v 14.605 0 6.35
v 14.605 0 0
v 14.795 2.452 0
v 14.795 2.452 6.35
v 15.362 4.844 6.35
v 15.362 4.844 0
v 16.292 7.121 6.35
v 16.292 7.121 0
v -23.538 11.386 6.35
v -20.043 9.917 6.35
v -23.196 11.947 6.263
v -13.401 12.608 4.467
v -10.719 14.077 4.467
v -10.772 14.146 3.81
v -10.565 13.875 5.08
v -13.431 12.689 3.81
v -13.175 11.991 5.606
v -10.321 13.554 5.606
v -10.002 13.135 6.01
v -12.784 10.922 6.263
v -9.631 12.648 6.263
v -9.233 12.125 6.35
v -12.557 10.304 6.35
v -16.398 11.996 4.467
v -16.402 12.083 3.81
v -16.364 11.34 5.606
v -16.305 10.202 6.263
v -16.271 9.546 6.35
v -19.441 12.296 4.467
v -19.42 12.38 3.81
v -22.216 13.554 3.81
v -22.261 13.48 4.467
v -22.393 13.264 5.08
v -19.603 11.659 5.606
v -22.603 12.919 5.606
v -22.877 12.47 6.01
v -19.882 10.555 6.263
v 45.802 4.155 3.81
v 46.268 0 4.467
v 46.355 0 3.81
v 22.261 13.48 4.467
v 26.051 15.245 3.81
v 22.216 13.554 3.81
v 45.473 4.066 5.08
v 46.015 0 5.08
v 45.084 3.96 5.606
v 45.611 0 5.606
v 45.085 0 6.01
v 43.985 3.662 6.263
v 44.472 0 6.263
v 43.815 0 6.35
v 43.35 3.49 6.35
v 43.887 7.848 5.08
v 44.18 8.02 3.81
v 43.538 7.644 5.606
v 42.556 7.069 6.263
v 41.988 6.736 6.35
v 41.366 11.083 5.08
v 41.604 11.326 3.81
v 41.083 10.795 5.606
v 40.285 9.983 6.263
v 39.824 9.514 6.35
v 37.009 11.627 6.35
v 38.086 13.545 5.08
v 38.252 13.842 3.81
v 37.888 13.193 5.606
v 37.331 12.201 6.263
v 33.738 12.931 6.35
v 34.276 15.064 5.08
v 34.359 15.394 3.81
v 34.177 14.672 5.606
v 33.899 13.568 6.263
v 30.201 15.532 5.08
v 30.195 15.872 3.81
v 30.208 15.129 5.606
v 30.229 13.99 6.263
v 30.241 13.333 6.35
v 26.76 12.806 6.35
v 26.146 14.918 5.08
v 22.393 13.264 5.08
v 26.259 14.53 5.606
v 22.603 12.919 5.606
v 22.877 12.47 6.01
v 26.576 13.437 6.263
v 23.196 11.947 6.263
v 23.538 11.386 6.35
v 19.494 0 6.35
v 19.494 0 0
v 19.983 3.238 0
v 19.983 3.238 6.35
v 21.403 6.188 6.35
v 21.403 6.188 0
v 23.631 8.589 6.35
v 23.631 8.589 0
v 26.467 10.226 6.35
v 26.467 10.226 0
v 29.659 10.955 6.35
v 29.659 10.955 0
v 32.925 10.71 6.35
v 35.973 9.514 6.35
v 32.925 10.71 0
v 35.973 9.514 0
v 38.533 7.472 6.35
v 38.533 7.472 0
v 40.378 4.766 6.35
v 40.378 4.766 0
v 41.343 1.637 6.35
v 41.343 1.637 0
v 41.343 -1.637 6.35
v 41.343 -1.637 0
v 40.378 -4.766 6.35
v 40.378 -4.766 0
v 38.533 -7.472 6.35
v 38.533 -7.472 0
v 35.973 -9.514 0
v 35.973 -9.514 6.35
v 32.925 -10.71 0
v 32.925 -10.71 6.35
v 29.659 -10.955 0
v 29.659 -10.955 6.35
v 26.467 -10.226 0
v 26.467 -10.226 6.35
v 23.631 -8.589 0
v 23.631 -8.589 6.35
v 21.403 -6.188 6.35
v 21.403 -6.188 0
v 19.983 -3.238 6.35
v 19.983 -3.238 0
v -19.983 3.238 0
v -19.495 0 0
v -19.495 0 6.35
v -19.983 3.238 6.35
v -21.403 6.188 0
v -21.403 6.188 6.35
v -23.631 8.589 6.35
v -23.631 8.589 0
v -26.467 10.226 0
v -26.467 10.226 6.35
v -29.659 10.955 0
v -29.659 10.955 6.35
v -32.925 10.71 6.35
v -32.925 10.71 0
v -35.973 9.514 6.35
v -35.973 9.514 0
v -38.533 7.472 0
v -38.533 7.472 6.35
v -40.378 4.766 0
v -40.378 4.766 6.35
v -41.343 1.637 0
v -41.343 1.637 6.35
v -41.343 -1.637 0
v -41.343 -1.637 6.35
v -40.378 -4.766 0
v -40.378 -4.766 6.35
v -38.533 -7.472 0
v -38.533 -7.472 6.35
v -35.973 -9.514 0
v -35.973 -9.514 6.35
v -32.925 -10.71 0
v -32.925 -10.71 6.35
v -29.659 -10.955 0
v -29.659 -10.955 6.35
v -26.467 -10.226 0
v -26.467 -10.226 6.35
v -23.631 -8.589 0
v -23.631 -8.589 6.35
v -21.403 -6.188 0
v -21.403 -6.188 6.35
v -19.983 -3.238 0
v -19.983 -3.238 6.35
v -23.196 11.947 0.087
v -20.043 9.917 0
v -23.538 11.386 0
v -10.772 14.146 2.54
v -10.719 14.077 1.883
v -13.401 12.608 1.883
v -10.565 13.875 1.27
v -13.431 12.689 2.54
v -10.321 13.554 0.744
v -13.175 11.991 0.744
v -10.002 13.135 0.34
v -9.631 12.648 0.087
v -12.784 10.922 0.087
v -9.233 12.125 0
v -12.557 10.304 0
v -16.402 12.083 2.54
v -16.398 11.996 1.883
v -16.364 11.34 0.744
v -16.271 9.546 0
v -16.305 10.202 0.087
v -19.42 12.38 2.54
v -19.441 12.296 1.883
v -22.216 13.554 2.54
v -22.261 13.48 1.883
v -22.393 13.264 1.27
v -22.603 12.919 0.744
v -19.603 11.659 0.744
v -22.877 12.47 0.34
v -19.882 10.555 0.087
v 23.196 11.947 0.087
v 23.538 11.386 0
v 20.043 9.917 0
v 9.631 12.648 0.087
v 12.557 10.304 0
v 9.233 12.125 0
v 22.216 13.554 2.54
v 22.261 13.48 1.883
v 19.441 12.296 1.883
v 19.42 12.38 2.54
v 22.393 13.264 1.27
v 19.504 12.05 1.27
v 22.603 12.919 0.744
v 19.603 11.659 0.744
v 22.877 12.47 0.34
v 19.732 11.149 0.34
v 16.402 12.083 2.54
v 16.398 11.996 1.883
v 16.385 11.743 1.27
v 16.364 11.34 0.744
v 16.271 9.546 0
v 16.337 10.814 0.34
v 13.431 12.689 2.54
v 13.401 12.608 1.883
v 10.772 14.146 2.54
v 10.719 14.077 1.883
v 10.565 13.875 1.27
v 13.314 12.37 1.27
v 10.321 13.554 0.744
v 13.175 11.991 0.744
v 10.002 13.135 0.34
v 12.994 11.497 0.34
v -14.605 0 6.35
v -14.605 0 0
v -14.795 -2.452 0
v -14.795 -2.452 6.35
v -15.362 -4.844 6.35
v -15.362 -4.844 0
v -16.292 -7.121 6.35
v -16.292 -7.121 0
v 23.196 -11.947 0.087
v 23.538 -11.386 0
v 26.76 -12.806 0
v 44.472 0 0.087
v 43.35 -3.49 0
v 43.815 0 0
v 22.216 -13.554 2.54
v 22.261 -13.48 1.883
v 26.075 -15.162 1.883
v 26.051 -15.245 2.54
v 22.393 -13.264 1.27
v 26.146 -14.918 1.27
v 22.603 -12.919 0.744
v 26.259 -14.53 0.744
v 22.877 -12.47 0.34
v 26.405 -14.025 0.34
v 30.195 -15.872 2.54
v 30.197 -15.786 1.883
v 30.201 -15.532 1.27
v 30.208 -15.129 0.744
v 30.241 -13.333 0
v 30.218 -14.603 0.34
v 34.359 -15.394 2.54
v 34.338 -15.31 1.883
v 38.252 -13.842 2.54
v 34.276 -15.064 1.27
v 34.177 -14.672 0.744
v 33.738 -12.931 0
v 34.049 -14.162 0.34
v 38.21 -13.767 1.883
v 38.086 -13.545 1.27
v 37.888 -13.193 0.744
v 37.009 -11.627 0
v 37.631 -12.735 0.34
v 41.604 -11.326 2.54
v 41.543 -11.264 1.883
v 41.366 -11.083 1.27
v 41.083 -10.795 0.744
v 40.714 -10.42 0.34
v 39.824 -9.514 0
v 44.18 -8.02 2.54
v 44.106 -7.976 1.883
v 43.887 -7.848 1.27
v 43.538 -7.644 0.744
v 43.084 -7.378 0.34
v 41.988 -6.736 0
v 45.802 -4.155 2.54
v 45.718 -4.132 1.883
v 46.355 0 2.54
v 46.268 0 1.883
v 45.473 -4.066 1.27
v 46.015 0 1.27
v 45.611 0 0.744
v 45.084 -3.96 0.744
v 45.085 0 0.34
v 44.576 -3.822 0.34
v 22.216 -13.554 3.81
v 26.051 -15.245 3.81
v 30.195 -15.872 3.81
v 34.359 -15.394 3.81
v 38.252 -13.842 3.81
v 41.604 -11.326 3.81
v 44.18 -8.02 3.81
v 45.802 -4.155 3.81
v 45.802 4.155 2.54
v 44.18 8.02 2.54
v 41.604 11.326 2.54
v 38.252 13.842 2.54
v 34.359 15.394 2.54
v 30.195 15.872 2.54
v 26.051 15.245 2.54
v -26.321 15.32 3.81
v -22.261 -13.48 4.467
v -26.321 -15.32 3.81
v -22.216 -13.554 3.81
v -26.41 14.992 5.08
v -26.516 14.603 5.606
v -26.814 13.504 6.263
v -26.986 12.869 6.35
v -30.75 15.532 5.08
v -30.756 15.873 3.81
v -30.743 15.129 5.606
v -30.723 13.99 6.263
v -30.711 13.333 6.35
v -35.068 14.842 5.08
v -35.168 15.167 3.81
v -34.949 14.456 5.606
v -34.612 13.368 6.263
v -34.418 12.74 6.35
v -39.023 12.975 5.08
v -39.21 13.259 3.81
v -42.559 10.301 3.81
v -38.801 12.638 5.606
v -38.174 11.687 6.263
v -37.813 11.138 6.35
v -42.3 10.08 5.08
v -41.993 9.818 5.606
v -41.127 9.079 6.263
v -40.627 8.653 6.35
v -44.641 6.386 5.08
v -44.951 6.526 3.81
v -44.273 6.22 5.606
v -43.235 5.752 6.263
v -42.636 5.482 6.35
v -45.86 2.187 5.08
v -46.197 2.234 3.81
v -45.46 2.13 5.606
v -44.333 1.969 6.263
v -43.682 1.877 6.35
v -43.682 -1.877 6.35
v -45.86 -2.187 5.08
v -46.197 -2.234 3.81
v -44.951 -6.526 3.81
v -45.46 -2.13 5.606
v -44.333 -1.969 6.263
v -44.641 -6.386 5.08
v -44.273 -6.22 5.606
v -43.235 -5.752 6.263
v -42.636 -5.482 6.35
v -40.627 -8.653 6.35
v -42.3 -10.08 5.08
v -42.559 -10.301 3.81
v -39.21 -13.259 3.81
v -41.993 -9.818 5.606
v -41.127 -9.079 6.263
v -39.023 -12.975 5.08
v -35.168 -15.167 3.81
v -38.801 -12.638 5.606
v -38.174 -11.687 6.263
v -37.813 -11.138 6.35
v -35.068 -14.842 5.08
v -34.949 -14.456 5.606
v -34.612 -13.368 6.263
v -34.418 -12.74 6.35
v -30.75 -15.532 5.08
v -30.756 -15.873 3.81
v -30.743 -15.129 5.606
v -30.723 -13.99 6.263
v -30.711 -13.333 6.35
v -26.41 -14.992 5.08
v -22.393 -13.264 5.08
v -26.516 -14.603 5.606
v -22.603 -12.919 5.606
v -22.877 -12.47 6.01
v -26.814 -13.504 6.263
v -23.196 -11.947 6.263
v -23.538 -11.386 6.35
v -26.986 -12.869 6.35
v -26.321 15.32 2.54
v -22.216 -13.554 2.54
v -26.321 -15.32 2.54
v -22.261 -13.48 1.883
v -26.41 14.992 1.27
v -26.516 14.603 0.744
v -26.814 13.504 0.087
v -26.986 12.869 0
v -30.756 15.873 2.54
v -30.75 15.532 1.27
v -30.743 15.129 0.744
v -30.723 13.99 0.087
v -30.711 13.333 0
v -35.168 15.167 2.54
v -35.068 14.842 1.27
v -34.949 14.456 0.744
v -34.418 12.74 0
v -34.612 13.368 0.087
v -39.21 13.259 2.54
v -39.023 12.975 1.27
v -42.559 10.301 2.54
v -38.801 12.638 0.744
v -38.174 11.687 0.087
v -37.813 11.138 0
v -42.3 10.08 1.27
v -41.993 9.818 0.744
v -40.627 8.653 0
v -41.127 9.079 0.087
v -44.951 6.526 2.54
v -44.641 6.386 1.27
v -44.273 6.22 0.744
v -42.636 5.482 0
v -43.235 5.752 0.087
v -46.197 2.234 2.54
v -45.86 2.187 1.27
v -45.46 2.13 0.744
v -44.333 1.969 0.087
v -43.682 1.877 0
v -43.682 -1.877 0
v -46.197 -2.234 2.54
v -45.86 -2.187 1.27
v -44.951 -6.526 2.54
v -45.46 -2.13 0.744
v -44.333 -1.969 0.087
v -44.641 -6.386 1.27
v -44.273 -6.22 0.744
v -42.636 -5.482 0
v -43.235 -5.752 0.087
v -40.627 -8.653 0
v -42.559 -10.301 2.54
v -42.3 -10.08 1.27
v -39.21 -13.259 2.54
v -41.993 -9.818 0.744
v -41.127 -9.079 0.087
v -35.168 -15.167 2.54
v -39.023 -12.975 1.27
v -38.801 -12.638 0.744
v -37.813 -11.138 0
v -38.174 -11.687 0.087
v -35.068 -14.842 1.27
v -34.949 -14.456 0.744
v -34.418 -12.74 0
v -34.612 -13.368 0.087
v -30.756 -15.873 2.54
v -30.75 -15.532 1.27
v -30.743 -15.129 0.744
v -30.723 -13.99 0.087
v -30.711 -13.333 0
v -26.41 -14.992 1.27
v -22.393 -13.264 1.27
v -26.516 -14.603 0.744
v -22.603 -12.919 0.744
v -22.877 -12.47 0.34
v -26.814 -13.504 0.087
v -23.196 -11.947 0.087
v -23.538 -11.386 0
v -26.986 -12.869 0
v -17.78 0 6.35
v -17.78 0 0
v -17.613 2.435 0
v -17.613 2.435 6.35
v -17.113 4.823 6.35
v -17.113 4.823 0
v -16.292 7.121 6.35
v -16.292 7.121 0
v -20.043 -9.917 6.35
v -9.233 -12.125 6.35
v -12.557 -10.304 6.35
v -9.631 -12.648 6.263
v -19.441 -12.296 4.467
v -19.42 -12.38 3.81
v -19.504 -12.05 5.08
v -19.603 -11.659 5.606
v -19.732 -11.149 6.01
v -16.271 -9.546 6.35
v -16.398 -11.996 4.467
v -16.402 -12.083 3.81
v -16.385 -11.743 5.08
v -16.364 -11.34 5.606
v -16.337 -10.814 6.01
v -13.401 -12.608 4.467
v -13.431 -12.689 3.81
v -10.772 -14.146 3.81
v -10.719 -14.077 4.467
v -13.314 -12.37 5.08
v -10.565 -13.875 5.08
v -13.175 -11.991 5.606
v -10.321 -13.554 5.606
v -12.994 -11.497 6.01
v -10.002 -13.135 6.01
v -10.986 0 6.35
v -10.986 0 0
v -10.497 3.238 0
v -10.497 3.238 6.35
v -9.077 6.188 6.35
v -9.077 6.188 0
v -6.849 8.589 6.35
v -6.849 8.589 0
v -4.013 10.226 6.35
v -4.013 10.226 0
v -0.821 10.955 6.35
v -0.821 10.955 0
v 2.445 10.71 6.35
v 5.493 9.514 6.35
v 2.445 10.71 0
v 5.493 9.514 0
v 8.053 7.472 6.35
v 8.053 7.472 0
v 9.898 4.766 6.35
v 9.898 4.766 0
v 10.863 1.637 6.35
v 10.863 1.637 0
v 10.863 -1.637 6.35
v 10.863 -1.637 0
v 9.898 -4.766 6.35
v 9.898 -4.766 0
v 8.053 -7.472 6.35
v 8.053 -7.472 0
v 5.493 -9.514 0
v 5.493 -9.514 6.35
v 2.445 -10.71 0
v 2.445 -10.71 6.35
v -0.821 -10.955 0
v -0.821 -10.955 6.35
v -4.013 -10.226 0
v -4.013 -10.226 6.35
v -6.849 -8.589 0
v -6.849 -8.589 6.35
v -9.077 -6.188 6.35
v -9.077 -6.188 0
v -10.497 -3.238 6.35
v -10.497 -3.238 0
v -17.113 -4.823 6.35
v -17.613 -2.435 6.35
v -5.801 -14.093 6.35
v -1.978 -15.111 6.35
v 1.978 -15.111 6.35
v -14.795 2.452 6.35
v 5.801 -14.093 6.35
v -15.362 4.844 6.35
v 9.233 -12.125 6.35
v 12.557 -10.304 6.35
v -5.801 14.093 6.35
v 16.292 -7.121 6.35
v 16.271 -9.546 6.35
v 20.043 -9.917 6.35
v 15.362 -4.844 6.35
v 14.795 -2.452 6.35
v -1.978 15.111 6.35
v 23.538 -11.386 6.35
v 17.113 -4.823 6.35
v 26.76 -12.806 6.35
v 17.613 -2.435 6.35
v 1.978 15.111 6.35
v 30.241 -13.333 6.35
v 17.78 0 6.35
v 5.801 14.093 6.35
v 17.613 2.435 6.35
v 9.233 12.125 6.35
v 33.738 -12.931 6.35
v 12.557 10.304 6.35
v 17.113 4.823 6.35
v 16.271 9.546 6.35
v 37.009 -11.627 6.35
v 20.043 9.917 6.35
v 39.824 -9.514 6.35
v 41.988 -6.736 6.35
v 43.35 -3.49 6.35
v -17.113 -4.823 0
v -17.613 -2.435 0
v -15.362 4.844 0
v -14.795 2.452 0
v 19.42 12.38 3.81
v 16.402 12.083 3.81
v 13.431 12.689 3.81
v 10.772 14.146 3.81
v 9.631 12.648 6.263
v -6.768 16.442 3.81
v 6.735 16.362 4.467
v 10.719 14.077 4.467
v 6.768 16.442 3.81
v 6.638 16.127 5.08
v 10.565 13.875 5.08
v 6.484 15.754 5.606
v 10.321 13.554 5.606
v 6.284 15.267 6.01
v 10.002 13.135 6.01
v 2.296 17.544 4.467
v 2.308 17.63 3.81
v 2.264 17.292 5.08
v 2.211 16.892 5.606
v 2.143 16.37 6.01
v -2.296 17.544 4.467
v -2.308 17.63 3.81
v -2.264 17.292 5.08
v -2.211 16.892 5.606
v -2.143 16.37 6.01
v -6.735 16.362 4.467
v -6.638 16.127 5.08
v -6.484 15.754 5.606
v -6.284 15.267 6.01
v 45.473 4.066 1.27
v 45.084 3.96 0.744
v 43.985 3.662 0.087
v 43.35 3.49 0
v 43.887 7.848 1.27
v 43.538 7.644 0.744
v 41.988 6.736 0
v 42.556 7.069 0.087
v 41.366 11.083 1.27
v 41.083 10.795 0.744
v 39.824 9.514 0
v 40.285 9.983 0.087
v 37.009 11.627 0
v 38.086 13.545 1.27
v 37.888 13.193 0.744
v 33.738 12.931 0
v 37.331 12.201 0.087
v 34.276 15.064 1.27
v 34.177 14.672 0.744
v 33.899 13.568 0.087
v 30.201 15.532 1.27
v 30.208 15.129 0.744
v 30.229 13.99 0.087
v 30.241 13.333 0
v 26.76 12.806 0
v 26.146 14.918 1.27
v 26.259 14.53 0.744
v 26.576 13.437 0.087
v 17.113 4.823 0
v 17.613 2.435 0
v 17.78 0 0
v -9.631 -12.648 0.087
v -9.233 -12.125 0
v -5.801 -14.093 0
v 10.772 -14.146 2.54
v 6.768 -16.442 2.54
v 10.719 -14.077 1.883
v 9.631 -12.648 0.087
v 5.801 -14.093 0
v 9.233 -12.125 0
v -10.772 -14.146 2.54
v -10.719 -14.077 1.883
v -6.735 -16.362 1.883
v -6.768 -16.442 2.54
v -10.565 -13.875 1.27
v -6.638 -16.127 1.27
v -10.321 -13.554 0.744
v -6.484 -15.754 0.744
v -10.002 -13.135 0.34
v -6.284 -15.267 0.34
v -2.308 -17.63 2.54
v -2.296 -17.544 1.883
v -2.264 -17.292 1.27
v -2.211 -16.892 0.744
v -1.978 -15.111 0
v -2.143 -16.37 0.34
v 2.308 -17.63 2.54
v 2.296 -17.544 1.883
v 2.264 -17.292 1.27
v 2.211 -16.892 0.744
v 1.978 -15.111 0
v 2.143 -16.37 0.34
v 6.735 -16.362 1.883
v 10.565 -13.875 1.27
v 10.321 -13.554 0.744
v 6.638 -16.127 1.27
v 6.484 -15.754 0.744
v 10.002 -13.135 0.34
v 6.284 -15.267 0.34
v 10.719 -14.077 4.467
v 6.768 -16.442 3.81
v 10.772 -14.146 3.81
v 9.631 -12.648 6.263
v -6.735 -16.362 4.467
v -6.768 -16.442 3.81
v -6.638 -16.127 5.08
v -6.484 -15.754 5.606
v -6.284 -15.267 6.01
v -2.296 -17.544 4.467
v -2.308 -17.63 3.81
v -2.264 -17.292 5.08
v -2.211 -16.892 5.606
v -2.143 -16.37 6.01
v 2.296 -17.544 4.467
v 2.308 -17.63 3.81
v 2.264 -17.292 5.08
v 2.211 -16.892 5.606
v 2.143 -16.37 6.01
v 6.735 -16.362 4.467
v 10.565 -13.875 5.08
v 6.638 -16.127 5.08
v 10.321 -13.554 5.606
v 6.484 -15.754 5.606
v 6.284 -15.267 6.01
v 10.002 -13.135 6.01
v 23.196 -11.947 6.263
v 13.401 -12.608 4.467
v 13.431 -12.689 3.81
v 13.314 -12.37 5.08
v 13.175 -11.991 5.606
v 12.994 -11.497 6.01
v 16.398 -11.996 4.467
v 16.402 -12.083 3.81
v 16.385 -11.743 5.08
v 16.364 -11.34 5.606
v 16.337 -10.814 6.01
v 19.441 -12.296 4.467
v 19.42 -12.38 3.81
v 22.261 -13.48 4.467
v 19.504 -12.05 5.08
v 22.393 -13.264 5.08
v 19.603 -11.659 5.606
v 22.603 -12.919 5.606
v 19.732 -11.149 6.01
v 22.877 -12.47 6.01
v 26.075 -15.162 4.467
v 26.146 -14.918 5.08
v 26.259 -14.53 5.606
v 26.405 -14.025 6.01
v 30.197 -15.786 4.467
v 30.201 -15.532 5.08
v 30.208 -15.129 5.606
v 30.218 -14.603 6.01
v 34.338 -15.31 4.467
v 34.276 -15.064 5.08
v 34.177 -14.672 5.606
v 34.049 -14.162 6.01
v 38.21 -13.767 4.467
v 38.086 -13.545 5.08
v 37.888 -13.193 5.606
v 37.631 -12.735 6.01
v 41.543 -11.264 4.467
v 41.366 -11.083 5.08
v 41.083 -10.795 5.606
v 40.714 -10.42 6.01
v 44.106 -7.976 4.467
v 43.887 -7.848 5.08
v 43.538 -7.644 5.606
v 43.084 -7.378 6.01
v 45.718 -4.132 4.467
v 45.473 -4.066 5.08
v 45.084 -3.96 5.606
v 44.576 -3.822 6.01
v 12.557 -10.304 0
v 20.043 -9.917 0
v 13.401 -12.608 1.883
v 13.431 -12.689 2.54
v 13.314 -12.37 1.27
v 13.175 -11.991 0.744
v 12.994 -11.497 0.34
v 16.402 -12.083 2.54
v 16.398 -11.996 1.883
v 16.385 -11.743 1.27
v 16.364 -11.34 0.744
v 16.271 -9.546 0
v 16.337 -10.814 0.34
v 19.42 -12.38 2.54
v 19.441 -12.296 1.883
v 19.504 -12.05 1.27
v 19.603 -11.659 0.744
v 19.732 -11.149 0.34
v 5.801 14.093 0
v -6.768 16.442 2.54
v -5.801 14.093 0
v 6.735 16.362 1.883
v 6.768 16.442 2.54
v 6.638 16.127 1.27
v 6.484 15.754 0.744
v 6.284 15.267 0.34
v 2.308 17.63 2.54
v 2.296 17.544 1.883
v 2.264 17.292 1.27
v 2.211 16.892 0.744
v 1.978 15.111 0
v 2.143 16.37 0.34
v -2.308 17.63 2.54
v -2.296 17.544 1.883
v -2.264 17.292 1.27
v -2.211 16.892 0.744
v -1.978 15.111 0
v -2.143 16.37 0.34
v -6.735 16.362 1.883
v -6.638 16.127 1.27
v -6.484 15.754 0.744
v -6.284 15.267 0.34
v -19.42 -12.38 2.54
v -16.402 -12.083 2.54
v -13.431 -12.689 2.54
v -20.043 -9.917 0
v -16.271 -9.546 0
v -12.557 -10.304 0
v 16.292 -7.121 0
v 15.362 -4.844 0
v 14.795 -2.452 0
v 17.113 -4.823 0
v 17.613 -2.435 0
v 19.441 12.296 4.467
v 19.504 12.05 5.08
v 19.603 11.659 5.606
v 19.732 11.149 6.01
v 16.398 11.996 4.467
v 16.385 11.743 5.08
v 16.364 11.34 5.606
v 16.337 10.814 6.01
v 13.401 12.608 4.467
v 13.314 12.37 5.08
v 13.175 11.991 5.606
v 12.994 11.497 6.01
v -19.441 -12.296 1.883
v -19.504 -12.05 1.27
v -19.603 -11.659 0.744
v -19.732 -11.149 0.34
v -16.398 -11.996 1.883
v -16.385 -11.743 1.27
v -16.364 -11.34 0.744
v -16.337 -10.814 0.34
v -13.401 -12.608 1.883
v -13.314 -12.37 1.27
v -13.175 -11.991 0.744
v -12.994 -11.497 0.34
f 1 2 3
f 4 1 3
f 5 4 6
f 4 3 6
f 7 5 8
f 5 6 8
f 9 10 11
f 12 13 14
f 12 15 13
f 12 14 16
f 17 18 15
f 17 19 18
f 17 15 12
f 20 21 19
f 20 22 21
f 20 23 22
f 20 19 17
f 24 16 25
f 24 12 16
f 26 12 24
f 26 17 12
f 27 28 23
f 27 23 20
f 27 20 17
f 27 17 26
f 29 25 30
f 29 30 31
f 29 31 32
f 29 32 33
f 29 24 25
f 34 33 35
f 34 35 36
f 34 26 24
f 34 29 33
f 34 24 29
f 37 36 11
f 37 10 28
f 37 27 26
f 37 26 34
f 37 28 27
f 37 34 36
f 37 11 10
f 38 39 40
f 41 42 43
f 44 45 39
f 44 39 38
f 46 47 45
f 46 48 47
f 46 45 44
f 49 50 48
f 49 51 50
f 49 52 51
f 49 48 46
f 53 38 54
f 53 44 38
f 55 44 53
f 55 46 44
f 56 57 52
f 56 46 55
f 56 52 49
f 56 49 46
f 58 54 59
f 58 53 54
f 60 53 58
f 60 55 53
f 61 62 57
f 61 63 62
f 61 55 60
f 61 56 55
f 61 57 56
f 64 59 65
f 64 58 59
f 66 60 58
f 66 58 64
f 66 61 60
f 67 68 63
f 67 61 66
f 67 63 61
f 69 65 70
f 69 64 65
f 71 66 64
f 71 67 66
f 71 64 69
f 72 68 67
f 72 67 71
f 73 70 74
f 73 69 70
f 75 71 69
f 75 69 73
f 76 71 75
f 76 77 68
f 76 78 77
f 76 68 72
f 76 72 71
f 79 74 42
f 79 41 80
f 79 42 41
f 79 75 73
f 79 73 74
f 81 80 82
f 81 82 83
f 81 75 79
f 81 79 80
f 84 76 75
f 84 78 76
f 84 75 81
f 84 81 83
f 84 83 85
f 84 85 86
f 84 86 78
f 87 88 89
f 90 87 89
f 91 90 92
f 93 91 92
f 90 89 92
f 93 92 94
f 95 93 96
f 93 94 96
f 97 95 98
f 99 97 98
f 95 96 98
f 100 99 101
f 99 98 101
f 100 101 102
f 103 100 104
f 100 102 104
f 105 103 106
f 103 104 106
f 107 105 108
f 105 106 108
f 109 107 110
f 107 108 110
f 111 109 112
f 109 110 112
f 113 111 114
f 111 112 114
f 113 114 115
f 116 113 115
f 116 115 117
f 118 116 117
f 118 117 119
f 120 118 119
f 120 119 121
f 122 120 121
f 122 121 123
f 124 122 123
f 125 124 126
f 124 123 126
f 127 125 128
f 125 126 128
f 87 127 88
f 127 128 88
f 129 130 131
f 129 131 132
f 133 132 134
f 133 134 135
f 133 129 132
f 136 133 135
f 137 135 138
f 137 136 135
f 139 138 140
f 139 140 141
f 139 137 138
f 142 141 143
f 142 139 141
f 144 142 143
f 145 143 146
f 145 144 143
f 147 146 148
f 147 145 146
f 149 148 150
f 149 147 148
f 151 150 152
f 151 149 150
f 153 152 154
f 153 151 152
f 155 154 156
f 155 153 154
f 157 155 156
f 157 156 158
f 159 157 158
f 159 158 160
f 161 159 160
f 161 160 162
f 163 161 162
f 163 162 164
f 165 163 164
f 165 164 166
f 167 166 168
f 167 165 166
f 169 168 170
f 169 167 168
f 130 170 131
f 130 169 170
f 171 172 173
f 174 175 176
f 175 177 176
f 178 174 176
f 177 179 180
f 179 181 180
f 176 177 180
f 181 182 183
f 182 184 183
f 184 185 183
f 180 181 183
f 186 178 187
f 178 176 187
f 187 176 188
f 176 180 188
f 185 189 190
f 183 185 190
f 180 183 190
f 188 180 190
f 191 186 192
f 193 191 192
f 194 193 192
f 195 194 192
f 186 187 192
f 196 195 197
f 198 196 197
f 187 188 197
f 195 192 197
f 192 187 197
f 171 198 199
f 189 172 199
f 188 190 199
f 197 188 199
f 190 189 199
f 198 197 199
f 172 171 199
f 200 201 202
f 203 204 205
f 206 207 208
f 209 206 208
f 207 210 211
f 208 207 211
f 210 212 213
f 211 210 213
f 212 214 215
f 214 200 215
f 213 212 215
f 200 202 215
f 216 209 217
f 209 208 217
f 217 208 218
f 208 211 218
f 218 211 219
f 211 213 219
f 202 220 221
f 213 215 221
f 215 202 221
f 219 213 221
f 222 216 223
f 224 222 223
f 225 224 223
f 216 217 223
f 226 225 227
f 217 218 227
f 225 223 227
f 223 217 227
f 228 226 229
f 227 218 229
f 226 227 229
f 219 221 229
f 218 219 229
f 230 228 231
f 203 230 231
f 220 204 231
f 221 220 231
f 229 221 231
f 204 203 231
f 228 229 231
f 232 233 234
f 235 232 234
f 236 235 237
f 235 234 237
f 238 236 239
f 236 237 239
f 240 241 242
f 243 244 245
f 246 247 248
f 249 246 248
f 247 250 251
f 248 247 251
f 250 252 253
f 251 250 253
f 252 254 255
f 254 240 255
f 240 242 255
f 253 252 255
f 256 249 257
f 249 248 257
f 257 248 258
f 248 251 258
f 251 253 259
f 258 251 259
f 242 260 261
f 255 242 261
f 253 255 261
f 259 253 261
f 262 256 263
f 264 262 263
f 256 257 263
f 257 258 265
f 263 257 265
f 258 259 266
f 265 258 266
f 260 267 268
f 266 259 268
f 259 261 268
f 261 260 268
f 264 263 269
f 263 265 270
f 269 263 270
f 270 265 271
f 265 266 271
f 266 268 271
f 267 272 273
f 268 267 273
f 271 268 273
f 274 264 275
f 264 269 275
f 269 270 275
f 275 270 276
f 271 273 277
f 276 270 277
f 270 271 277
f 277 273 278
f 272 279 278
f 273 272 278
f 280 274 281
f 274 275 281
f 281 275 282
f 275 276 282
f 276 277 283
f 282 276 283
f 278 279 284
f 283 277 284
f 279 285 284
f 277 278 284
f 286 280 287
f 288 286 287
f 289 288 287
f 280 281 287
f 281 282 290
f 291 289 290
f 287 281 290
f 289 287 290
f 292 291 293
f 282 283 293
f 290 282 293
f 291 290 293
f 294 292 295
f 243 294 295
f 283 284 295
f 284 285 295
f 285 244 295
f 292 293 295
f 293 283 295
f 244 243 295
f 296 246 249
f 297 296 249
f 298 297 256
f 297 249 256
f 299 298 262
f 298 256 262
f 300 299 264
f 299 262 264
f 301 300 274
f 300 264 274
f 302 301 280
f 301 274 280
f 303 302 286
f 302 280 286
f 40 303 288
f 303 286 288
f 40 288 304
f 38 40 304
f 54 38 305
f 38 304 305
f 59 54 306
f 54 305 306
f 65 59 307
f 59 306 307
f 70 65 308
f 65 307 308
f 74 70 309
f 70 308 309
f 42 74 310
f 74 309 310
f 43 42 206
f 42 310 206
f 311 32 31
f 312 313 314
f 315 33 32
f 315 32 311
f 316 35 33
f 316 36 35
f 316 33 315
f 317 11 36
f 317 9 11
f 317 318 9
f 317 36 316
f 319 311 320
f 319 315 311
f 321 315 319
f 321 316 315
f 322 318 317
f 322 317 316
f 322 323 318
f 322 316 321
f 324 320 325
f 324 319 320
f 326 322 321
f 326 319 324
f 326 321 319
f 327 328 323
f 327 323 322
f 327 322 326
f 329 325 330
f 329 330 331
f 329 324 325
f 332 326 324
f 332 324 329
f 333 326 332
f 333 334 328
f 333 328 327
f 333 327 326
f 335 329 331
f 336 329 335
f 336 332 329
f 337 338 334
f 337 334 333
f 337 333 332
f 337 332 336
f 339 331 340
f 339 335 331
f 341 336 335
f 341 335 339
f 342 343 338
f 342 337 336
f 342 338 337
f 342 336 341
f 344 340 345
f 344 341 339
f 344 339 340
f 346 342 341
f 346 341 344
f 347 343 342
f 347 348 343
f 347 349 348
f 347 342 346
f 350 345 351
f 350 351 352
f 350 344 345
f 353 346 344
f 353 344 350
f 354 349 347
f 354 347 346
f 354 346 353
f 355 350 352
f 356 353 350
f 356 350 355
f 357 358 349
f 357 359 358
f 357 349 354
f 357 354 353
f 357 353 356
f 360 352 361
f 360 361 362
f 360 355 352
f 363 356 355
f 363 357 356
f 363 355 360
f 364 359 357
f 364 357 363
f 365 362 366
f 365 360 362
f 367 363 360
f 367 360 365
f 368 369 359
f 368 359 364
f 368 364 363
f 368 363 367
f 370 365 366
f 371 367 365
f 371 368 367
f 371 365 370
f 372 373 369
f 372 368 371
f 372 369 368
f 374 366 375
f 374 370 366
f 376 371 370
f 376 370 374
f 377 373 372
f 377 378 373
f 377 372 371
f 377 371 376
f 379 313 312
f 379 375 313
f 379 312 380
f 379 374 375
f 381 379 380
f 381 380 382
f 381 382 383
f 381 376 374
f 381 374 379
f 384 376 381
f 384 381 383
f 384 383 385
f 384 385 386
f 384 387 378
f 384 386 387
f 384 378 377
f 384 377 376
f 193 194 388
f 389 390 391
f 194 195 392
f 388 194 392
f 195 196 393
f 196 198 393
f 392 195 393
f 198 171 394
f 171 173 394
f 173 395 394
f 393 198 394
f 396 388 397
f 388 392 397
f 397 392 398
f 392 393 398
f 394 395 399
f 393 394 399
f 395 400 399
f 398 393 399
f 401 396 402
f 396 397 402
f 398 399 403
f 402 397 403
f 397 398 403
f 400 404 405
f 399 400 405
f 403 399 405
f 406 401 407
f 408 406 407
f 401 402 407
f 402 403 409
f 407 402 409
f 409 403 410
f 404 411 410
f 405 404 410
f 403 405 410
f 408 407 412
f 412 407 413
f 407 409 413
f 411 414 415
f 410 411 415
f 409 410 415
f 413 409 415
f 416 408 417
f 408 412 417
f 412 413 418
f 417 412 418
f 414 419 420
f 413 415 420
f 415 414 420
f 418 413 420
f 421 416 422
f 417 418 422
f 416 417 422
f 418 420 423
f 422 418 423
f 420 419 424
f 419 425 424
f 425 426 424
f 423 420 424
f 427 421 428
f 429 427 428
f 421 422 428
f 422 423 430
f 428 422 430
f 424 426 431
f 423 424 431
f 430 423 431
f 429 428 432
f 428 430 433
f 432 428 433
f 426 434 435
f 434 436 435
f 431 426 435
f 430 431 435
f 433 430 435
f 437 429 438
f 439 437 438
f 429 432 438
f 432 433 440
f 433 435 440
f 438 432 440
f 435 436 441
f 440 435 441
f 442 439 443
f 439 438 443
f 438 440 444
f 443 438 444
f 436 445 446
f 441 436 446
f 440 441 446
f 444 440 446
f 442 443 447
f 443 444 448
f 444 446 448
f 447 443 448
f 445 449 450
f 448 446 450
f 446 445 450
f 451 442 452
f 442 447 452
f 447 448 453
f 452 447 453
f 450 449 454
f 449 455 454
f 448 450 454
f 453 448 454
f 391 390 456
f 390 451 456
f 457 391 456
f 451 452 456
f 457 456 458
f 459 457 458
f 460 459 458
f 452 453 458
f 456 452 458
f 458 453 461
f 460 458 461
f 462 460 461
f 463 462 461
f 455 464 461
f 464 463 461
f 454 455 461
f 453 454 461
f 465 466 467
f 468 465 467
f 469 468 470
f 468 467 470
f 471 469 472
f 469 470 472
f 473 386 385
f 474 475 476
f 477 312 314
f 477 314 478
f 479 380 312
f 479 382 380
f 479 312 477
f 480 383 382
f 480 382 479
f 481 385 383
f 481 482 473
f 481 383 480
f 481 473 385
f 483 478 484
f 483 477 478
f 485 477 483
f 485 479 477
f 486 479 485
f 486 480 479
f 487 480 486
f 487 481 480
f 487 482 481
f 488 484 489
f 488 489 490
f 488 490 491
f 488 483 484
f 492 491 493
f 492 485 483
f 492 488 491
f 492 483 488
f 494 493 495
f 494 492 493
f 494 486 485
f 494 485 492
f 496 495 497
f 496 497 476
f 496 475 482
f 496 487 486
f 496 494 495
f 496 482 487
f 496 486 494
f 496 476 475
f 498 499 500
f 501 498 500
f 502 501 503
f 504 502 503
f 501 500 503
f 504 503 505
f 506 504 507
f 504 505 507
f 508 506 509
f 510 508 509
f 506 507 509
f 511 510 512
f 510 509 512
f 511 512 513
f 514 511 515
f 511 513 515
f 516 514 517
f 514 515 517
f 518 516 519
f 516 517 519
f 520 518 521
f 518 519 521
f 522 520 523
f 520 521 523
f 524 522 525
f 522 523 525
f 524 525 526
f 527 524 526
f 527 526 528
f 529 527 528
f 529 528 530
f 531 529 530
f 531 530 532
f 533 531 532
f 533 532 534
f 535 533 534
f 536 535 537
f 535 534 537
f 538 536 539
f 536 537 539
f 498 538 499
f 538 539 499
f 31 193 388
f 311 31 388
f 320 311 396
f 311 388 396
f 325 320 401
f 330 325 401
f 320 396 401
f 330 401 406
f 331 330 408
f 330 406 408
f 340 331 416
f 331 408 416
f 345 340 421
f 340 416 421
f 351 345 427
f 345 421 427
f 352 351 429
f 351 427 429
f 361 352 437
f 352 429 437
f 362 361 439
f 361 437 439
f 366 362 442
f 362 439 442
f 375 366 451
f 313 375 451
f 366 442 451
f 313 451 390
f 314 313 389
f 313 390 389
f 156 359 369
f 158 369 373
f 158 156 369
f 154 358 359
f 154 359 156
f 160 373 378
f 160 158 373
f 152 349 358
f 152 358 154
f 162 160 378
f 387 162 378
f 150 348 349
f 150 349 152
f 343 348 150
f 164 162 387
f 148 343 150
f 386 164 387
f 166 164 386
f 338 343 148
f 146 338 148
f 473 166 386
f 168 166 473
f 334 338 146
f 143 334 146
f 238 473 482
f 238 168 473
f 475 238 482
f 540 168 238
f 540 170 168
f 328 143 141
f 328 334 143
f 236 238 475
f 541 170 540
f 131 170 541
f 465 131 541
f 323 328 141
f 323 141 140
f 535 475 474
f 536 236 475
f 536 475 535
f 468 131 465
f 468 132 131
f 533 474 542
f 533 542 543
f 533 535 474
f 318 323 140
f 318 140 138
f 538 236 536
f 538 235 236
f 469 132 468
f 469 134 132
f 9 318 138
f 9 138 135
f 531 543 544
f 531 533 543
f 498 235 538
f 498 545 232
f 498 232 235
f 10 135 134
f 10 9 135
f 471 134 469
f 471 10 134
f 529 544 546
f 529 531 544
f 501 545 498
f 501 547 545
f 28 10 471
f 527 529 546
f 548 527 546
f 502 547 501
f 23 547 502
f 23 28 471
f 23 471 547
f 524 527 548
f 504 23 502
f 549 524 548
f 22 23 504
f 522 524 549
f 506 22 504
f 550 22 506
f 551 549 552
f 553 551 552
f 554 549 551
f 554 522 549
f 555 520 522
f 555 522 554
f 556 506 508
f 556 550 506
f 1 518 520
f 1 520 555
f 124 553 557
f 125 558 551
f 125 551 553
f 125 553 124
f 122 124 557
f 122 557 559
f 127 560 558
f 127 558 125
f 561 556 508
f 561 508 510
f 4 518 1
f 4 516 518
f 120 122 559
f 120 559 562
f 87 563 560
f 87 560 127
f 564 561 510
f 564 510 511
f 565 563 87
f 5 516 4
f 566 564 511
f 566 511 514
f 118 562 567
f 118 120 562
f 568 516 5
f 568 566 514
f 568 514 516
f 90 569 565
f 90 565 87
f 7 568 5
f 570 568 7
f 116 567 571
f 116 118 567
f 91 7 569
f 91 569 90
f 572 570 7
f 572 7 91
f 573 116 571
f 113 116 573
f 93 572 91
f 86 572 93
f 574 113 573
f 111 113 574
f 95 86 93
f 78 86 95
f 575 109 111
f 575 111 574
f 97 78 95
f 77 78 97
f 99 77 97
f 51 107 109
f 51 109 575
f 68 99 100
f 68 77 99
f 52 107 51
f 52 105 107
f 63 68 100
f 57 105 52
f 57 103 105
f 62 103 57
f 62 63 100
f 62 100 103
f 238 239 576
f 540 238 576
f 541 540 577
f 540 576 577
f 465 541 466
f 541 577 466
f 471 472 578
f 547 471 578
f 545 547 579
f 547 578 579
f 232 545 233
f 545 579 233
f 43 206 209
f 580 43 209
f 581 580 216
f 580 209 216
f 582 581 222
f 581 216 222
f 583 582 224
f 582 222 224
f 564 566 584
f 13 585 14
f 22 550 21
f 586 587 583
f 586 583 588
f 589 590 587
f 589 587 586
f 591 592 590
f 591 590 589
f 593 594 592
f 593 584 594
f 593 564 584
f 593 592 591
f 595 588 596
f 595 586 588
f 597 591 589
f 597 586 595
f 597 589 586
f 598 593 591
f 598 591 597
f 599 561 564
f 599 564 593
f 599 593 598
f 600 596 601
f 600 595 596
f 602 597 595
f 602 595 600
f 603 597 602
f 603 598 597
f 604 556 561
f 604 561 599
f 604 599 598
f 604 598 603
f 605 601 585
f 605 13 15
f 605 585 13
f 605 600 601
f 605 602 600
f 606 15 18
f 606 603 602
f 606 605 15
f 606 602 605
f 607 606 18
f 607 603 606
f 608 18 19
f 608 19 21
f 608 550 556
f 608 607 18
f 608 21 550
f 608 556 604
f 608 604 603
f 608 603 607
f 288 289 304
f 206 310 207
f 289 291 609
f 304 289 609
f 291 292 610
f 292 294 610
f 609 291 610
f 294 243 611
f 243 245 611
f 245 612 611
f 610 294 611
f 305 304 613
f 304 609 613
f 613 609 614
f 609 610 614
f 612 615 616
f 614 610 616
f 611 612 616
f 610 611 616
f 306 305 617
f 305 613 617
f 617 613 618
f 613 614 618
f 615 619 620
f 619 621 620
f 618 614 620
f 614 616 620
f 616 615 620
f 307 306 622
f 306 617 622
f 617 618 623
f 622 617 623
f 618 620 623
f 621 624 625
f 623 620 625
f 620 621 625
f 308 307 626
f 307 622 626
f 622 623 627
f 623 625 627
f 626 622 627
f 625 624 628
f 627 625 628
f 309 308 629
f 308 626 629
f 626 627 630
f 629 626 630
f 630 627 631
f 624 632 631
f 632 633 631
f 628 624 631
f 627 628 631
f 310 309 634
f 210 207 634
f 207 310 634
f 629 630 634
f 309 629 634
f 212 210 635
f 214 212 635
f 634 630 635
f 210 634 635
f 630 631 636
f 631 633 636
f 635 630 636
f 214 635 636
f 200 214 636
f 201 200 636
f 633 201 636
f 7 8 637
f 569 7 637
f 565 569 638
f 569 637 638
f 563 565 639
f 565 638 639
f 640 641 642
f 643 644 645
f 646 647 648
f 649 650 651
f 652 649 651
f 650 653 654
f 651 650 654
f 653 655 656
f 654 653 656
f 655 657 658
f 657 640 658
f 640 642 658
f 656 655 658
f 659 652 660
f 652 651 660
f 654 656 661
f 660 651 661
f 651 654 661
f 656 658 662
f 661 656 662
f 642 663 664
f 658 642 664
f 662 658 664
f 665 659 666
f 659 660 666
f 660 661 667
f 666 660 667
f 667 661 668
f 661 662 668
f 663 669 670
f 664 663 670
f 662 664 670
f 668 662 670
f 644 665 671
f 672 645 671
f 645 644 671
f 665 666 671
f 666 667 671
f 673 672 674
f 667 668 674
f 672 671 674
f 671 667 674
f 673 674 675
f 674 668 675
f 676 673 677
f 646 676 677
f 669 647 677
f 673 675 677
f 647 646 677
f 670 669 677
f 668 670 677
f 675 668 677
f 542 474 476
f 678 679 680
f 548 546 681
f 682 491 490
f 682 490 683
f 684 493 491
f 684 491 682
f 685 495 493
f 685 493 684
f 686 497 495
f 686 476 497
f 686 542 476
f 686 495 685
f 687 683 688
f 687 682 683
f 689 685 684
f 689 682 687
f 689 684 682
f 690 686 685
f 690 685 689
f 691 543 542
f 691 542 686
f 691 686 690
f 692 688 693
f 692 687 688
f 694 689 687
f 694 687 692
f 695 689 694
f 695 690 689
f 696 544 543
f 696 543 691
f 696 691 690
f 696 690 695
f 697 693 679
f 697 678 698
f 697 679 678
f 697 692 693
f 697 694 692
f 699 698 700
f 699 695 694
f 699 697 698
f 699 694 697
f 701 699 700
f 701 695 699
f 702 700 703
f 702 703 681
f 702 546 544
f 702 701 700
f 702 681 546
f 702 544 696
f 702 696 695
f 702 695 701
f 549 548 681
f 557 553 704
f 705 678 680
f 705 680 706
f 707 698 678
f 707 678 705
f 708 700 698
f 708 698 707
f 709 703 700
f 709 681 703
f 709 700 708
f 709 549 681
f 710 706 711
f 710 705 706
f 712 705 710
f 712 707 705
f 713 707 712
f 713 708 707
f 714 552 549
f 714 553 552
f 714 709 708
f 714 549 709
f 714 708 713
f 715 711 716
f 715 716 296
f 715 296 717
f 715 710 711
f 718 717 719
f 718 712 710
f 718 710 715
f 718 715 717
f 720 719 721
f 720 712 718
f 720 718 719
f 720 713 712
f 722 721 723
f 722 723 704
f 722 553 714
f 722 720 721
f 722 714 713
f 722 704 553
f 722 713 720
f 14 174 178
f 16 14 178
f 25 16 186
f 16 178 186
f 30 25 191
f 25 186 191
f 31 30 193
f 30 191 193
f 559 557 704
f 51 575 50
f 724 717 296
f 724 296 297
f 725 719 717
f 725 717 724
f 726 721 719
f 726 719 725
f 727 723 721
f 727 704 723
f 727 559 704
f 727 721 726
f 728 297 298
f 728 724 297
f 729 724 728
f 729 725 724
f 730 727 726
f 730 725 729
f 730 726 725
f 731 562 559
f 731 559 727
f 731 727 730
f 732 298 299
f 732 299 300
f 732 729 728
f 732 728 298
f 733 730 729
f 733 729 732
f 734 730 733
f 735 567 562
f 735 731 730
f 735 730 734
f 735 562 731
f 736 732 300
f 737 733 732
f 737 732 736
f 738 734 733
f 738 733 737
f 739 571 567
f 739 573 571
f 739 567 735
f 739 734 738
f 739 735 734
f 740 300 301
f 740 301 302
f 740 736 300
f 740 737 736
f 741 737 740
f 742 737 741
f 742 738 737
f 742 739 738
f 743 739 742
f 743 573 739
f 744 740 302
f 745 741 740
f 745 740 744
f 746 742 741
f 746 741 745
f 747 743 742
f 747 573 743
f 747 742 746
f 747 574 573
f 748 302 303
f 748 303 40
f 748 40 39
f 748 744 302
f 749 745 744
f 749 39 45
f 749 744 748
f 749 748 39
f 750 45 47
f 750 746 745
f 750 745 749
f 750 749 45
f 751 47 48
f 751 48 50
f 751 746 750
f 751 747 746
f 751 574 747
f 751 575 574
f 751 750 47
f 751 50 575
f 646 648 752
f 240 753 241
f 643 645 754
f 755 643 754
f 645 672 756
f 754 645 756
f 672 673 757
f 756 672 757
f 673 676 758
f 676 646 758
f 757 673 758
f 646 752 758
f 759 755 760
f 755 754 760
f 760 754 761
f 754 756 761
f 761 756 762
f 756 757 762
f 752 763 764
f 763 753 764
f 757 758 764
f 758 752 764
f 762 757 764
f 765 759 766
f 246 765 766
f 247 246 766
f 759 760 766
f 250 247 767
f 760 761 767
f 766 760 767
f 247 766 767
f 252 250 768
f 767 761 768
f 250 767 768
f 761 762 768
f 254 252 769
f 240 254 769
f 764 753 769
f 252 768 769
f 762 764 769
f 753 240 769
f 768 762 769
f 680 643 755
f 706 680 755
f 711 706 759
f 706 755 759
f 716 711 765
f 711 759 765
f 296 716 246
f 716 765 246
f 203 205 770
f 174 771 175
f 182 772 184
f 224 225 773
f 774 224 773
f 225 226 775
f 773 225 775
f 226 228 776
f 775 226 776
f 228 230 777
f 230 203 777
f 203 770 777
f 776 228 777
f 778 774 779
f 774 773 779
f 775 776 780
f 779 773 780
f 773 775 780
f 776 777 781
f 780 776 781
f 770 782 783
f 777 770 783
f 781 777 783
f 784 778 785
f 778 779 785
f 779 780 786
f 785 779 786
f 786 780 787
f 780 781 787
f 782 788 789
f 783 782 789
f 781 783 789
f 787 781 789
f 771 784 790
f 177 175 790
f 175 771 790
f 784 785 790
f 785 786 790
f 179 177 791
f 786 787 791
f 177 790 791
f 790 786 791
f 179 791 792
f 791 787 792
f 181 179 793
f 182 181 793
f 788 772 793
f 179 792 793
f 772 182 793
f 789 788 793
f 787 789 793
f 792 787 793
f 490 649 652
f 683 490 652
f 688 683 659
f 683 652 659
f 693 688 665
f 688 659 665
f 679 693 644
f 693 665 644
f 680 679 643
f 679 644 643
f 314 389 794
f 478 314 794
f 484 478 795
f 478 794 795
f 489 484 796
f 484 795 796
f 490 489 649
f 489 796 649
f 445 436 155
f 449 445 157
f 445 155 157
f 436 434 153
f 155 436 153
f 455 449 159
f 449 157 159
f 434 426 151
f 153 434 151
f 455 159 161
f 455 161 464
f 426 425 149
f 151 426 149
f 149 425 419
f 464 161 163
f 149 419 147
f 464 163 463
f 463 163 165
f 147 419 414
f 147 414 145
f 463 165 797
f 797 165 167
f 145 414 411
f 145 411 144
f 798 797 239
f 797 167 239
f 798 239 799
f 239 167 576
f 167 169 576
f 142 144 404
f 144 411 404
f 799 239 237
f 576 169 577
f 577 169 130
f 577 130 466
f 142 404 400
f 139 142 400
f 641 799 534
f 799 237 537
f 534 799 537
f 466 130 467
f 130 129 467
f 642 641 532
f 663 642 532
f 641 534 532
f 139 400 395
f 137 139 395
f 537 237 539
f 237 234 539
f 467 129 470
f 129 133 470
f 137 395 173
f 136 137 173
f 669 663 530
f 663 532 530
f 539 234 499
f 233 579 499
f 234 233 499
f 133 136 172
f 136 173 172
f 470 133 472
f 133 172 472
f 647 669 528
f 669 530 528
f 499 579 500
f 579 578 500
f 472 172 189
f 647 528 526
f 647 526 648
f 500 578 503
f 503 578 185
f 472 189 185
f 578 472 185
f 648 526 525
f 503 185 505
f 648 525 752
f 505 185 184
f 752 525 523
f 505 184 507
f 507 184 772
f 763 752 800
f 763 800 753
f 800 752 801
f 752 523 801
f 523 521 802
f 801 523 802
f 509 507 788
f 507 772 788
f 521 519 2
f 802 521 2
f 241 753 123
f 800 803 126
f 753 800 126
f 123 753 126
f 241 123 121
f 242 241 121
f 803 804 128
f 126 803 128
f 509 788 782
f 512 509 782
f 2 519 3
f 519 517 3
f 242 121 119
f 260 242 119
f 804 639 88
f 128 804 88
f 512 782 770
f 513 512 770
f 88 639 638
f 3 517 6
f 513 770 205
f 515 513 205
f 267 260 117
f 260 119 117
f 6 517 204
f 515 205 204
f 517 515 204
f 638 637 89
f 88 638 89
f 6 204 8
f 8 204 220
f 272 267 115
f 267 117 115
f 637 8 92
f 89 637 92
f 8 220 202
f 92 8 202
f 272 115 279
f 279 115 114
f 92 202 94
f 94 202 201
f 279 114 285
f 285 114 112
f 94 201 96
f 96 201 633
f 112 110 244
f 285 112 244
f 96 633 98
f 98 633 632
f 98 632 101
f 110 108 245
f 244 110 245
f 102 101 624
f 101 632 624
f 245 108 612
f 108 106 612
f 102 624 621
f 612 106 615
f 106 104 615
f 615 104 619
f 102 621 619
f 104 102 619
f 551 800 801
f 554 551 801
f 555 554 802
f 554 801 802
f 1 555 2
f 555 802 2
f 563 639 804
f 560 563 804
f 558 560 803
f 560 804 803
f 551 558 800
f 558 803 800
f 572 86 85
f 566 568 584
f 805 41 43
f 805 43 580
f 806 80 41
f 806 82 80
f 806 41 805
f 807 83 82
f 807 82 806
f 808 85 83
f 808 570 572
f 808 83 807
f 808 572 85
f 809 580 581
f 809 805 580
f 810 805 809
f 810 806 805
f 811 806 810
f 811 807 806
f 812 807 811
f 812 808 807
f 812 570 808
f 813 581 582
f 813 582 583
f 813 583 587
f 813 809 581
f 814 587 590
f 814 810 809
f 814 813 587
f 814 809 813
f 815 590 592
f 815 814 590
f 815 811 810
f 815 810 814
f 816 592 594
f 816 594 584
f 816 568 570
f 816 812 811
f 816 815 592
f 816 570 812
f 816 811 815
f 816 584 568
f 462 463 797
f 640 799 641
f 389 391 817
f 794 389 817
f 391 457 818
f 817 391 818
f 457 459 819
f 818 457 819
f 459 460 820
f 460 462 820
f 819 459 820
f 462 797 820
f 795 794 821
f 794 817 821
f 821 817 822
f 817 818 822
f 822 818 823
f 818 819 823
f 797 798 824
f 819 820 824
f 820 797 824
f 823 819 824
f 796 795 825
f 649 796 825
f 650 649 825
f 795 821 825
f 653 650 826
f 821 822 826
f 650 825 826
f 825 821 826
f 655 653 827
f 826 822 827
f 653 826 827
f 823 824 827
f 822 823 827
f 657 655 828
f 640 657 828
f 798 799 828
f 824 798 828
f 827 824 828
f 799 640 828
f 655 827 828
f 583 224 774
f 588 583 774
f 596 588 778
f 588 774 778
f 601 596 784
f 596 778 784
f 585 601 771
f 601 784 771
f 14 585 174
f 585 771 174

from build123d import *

# Parameters (mm, degrees)
F0_R     = 10.9855
F1_DEPTH = 6.35
F2_R     = 2.54


with BuildPart() as f1:
    # F0 (on Top) → F1 (new body)
    with BuildSketch(Plane.XY):
        with BuildLine():
            ThreePointArc((-16.29171875, -7.1209760687), (-17.4039529903, -3.6374194579), (-17.78, 0))
            ThreePointArc((-17.78, 0), (-17.4039529903, 3.6374194579), (-16.29171875, 7.1209760687))
            ThreePointArc((-16.29171875, 7.1209760687), (-18.8020162617, 10.7536189633), (-22.2158041159, 13.554286827))
            ThreePointArc((-22.2158041159, 13.554286827), (-46.355, 0), (-22.2158041159, -13.554286827))
            ThreePointArc((-22.2158041159, -13.554286827), (-18.8020162617, -10.7536189633), (-16.29171875, -7.1209760687))
        make_face()
        with Locations((-30.48, 0)):
            Circle(F0_R, mode=Mode.SUBTRACT)
        with BuildLine():
            ThreePointArc((-22.2158041159, 13.554286827), (-18.8020162617, 10.7536189633), (-16.29171875, 7.1209760687))
            ThreePointArc((-16.29171875, 7.1209760687), (-13.9800556545, 10.9857382044), (-10.7715482955, 14.1457466158))
            ThreePointArc((-10.7715482955, 14.1457466158), (-16.4023314736, 12.0825720001), (-22.2158041159, 13.554286827))
        make_face()
        with BuildLine():
            ThreePointArc((-10.7715482955, -14.1457466158), (-13.9800556545, -10.9857382044), (-16.29171875, -7.1209760687))
            ThreePointArc((-16.29171875, -7.1209760687), (-18.8020162617, -10.7536189633), (-22.2158041159, -13.554286827))
            ThreePointArc((-22.2158041159, -13.554286827), (-16.4023314736, -12.0825720001), (-10.7715482955, -14.1457466158))
        make_face()
        with BuildLine():
            Line((14.605, 0), (10.9855, 0))
            ThreePointArc((10.9855, 0), (0, -10.9855), (-10.9855, 0))
            Line((-10.9855, 0), (-14.605, 0))
            ThreePointArc((-14.605, 0), (-15.032434013, -3.6590067065), (-16.29171875, -7.1209760687))
            ThreePointArc((-16.29171875, -7.1209760687), (-13.9800556545, -10.9857382044), (-10.7715482955, -14.1457466158))
            ThreePointArc((-10.7715482955, -14.1457466158), (0, -17.78), (10.7715482955, -14.1457466158))
            ThreePointArc((10.7715482955, -14.1457466158), (13.9800556545, -10.9857382044), (16.29171875, -7.1209760687))
            ThreePointArc((16.29171875, -7.1209760687), (15.032434013, -3.6590067065), (14.605, 0))
        make_face()
        with BuildLine():
            ThreePointArc((-10.9855, 0), (0, 10.9855), (10.9855, 0))
            Line((10.9855, 0), (14.605, 0))
            ThreePointArc((14.605, 0), (15.032434013, 3.6590067065), (16.29171875, 7.1209760687))
            ThreePointArc((16.29171875, 7.1209760687), (13.9800556545, 10.9857382044), (10.7715482955, 14.1457466158))
            ThreePointArc((10.7715482955, 14.1457466158), (0, 17.78), (-10.7715482955, 14.1457466158))
            ThreePointArc((-10.7715482955, 14.1457466158), (-13.9800556545, 10.9857382044), (-16.29171875, 7.1209760687))
            ThreePointArc((-16.29171875, 7.1209760687), (-15.032434013, 3.6590067065), (-14.605, 0))
            Line((-14.605, 0), (-10.9855, 0))
        make_face()
        with BuildLine():
            ThreePointArc((10.7715482955, 14.1457466158), (13.9800556545, 10.9857382044), (16.29171875, 7.1209760687))
            ThreePointArc((16.29171875, 7.1209760687), (18.8020162617, 10.7536189633), (22.2158041159, 13.554286827))
            ThreePointArc((22.2158041159, 13.554286827), (16.4023314736, 12.0825720001), (10.7715482955, 14.1457466158))
        make_face()
        with BuildLine():
            ThreePointArc((22.2158041159, -13.554286827), (18.8020162617, -10.7536189633), (16.29171875, -7.1209760687))
            ThreePointArc((16.29171875, -7.1209760687), (13.9800556545, -10.9857382044), (10.7715482955, -14.1457466158))
            ThreePointArc((10.7715482955, -14.1457466158), (16.4023314736, -12.0825720001), (22.2158041159, -13.554286827))
        make_face()
        with BuildLine():
            ThreePointArc((16.29171875, 7.1209760687), (17.4039529903, 3.6374194579), (17.78, 0))
            ThreePointArc((17.78, 0), (17.4039529903, -3.6374194579), (16.29171875, -7.1209760687))
            ThreePointArc((16.29171875, -7.1209760687), (18.8020162617, -10.7536189633), (22.2158041159, -13.554286827))
            ThreePointArc((22.2158041159, -13.554286827), (38.2524357617, -13.8421409952), (46.355, 0))
            ThreePointArc((46.355, 0), (38.2524357617, 13.8421409952), (22.2158041159, 13.554286827))
            ThreePointArc((22.2158041159, 13.554286827), (18.8020162617, 10.7536189633), (16.29171875, 7.1209760687))
        make_face()
        with BuildLine():
            ThreePointArc((41.4655, 0), (30.48, -10.9855), (19.4945, 0))
            ThreePointArc((19.4945, 0), (30.48, 10.9855), (41.4655, 0))
        make_face(mode=Mode.SUBTRACT)
    extrude(amount=F1_DEPTH)

    # F2
    f2_edges = [f1.edges().sort_by_distance(p)[0] for p in [
        (-46.355, 0, 6.35),
        (-16.402331, 12.082572, 6.35),
        (0, 17.78, 6.35),
        (16.402331, 12.082572, 6.35),
        (46.355, 0, 6.35),
        (16.402331, -12.082572, 6.35),
        (0, -17.78, 6.35),
        (-16.402331, -12.082572, 6.35),
        (-46.355, 0, 0),
        (-16.402331, -12.082572, 0),
        (0, -17.78, 0),
        (-16.402331, 12.082572, 0),
        (0, 17.78, 0),
        (16.402331, -12.082572, 0),
        (46.355, 0, 0),
        (16.402331, 12.082572, 0),
    ]]
    fillet(f2_edges, radius=F2_R)


solid = f1.part
